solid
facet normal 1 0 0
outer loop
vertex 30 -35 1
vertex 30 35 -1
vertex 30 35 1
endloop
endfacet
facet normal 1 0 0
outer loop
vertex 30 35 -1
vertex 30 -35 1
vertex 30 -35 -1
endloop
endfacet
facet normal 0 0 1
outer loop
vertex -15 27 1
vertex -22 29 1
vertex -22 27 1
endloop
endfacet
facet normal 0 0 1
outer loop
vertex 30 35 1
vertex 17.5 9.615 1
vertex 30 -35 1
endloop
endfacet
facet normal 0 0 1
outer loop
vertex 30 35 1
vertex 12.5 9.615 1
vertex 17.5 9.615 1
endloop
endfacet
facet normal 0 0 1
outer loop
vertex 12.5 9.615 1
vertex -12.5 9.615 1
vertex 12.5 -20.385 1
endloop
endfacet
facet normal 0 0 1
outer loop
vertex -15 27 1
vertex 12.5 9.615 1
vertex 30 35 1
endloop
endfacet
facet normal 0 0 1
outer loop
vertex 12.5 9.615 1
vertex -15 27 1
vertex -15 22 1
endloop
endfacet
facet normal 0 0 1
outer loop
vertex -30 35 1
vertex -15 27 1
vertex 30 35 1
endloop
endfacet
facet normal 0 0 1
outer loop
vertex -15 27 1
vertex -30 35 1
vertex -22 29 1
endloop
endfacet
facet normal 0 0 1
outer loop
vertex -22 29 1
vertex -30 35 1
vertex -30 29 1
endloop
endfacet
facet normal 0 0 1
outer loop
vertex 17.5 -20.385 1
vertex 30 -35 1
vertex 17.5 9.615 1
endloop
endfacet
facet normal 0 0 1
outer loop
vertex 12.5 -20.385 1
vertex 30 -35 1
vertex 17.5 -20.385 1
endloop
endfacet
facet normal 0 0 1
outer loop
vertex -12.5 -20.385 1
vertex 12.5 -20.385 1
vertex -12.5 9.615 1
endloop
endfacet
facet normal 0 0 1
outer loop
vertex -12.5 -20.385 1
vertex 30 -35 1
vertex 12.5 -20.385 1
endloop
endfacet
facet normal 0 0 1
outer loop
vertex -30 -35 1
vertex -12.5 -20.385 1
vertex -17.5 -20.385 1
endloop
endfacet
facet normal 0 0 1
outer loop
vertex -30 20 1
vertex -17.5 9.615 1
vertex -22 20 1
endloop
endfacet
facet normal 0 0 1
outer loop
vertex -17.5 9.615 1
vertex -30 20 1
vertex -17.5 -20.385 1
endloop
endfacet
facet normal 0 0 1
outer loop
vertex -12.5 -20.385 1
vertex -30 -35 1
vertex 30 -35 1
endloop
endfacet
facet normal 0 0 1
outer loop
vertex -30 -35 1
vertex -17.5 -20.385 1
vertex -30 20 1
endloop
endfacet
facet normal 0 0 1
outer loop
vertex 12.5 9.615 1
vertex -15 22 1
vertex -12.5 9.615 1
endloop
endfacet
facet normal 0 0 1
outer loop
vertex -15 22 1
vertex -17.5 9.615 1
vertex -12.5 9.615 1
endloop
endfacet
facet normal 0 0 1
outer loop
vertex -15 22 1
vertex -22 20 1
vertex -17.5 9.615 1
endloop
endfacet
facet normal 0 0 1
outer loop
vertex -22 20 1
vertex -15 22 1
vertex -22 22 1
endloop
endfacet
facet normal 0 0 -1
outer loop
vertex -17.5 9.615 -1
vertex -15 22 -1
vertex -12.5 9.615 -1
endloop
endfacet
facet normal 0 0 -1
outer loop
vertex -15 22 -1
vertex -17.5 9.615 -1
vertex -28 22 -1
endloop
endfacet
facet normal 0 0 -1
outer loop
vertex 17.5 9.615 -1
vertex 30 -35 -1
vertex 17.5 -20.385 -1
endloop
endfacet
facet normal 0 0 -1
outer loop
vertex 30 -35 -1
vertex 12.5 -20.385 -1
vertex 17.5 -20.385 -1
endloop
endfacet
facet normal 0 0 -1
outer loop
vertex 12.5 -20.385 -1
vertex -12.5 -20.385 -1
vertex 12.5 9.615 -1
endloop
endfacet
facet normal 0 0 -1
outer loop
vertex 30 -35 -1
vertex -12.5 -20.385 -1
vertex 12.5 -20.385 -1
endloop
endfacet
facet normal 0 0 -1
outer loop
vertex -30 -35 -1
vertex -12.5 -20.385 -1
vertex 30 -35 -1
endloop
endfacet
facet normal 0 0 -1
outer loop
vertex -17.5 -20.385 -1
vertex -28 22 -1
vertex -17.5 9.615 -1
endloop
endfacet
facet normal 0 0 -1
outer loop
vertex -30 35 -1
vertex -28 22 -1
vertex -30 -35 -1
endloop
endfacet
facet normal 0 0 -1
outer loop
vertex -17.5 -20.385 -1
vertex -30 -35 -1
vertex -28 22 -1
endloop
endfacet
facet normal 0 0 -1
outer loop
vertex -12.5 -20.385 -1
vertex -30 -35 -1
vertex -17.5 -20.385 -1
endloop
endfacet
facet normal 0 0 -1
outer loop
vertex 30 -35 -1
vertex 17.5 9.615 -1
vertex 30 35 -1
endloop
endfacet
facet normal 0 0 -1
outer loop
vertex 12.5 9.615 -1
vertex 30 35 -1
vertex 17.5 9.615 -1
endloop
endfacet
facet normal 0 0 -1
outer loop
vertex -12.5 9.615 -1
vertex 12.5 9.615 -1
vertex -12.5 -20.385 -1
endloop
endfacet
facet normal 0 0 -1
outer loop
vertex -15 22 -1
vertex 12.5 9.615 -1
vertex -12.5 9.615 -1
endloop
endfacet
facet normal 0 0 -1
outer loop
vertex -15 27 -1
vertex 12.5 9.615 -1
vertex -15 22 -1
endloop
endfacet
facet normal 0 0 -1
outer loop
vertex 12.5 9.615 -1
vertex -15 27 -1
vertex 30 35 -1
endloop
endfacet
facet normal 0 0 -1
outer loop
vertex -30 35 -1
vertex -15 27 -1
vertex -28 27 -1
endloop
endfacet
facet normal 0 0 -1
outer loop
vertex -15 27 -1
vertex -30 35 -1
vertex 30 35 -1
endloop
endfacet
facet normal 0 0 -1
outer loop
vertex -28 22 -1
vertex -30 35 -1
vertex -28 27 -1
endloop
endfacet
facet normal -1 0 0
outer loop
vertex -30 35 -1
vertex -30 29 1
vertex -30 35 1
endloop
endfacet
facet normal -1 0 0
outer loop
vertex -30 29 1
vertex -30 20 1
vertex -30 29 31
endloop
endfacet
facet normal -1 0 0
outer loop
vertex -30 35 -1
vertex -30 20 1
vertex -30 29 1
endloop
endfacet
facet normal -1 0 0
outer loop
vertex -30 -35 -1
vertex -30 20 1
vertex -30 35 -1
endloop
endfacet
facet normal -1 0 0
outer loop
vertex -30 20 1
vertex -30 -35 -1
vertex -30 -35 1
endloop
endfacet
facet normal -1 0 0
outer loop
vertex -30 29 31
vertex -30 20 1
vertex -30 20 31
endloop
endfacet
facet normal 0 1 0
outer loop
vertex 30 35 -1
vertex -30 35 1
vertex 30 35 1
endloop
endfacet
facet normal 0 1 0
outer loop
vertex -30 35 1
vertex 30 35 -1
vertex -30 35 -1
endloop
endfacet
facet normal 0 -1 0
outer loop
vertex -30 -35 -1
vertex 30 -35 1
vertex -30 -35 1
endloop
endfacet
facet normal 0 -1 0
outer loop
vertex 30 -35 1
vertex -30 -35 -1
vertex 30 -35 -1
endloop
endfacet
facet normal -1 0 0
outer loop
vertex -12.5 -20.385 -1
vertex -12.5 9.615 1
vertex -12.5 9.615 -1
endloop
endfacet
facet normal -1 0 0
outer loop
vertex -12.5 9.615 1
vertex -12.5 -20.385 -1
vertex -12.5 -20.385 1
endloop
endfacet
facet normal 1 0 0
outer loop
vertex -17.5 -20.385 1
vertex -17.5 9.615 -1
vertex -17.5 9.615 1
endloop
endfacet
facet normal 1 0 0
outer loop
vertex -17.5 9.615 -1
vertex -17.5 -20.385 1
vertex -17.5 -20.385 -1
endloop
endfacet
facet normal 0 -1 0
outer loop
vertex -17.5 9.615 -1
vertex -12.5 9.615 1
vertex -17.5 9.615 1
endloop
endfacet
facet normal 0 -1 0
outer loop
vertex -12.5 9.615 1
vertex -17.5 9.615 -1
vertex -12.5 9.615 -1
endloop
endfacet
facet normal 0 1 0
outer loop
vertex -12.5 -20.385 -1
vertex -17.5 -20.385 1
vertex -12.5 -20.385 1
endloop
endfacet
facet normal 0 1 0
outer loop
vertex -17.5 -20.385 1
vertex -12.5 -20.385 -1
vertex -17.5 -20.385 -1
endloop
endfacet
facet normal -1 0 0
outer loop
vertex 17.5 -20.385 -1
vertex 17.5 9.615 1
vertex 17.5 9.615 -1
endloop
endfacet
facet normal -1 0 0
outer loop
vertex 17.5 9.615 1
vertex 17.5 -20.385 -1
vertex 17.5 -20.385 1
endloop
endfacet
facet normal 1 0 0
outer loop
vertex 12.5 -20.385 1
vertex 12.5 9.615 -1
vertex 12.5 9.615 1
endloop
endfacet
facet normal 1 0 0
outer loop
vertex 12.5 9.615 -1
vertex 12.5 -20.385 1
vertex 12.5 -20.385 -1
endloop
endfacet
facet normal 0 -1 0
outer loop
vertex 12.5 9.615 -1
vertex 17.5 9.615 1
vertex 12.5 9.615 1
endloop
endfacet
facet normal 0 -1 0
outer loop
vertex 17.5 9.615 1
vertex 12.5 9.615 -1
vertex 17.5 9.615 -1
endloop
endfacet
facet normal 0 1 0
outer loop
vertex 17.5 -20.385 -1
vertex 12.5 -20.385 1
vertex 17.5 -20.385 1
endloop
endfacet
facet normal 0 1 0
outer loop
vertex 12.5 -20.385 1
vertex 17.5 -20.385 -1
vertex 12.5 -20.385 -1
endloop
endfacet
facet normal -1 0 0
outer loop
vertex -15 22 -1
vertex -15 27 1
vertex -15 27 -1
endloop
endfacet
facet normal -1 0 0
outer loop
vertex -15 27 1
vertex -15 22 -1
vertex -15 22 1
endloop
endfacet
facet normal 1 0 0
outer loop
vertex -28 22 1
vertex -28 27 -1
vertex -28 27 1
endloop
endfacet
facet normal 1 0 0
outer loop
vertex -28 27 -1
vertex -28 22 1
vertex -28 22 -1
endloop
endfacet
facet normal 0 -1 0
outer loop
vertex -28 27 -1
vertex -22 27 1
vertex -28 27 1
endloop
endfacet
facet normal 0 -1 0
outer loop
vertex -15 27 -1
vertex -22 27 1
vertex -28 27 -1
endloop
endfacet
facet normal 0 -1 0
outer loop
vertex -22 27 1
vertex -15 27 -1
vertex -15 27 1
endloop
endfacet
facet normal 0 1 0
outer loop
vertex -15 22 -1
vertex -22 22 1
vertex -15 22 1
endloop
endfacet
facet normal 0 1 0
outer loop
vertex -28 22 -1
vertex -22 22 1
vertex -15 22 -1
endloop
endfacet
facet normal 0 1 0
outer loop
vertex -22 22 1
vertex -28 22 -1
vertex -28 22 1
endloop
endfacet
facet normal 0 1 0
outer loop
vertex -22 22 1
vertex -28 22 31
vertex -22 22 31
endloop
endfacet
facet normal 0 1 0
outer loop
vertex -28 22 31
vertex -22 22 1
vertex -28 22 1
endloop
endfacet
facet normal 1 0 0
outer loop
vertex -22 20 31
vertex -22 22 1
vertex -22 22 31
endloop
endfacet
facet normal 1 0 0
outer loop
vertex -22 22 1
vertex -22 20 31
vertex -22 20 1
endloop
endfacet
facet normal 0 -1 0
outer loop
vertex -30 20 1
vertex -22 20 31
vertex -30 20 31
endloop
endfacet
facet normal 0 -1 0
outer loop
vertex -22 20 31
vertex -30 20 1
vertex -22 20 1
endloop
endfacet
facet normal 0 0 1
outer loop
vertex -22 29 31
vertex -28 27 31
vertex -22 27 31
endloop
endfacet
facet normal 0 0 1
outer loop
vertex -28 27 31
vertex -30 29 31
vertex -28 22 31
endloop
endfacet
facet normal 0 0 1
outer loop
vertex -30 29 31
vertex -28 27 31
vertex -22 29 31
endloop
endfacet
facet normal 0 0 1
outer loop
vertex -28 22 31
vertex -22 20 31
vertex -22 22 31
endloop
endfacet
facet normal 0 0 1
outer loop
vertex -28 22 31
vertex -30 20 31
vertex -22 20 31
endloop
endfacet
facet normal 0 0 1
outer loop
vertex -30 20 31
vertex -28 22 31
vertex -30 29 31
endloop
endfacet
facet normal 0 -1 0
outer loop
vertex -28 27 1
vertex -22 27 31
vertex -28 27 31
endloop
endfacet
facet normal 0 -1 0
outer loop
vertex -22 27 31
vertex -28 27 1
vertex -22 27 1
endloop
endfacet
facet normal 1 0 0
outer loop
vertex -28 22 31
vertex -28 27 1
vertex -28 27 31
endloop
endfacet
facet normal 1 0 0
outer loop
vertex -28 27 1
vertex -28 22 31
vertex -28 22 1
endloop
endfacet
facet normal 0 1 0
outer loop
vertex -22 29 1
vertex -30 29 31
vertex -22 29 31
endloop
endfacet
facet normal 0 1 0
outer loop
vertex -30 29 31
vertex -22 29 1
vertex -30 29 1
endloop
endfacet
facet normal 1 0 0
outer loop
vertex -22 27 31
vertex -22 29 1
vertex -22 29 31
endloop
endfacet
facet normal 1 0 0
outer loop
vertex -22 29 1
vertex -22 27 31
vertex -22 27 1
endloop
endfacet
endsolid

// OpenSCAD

/* Rail Orientation*/
vertical = 1; //[1:Vertical,2:Horizontal]

/* Rack Rail */
rack_rail_height = 30;
rack_rail_width = 5;

rack_hole_height = 13;


/* Motor strap holes */
motor_hole_width = 5;
motor_hole_height = 30;

/* Base Plate size */
base_width = 60;
base_height = 70;


/*[Hidden]*/
rail_thickness=2;

//Holes
difference(){
    //base
    cube([base_width,base_height,2], center=true);
    
    //motor mount
    translate([-base_width/2+15,-base_height/13,0,])cube([motor_hole_width,motor_hole_height,10], center=true);
    translate([base_width/2-15,-base_height/13,0,])cube([motor_hole_width,motor_hole_height,10], center=true);
    
    //rack hole
    if (vertical == 1){
        translate([-base_width/2+rail_thickness,(base_height/2) -15 +rail_thickness,-5])cube([rack_hole_height, rack_rail_width, 10], center=false);
    }
};

//rail
module rack_rail(){
    
    
    if (vertical == 1){
        //vertical rail
        translate([-base_width/2, (base_height/2) -15,1])rotate([90,0,90])union(){
            cube([2,rack_rail_height,8], center=false);
            cube([2+rack_rail_width,rack_rail_height,2], center=false);
            translate([rail_thickness+rack_rail_width,0,0])cube([rail_thickness,rack_rail_height,8], center=false);
        };
    }
    else if (vertical == 2){
        //horizontal rail
        translate([rack_rail_height-(base_width/2), (base_height/2) -15,-1])rotate([0,0,90])union(){
            cube([2,rack_rail_height,8], center=false);
            cube([2+rack_rail_width,rack_rail_height,2], center=false);
            translate([rail_thickness+rack_rail_width,0,0])cube([rail_thickness,rack_rail_height,8], center=false);
        };
    }
};

rack_rail();
